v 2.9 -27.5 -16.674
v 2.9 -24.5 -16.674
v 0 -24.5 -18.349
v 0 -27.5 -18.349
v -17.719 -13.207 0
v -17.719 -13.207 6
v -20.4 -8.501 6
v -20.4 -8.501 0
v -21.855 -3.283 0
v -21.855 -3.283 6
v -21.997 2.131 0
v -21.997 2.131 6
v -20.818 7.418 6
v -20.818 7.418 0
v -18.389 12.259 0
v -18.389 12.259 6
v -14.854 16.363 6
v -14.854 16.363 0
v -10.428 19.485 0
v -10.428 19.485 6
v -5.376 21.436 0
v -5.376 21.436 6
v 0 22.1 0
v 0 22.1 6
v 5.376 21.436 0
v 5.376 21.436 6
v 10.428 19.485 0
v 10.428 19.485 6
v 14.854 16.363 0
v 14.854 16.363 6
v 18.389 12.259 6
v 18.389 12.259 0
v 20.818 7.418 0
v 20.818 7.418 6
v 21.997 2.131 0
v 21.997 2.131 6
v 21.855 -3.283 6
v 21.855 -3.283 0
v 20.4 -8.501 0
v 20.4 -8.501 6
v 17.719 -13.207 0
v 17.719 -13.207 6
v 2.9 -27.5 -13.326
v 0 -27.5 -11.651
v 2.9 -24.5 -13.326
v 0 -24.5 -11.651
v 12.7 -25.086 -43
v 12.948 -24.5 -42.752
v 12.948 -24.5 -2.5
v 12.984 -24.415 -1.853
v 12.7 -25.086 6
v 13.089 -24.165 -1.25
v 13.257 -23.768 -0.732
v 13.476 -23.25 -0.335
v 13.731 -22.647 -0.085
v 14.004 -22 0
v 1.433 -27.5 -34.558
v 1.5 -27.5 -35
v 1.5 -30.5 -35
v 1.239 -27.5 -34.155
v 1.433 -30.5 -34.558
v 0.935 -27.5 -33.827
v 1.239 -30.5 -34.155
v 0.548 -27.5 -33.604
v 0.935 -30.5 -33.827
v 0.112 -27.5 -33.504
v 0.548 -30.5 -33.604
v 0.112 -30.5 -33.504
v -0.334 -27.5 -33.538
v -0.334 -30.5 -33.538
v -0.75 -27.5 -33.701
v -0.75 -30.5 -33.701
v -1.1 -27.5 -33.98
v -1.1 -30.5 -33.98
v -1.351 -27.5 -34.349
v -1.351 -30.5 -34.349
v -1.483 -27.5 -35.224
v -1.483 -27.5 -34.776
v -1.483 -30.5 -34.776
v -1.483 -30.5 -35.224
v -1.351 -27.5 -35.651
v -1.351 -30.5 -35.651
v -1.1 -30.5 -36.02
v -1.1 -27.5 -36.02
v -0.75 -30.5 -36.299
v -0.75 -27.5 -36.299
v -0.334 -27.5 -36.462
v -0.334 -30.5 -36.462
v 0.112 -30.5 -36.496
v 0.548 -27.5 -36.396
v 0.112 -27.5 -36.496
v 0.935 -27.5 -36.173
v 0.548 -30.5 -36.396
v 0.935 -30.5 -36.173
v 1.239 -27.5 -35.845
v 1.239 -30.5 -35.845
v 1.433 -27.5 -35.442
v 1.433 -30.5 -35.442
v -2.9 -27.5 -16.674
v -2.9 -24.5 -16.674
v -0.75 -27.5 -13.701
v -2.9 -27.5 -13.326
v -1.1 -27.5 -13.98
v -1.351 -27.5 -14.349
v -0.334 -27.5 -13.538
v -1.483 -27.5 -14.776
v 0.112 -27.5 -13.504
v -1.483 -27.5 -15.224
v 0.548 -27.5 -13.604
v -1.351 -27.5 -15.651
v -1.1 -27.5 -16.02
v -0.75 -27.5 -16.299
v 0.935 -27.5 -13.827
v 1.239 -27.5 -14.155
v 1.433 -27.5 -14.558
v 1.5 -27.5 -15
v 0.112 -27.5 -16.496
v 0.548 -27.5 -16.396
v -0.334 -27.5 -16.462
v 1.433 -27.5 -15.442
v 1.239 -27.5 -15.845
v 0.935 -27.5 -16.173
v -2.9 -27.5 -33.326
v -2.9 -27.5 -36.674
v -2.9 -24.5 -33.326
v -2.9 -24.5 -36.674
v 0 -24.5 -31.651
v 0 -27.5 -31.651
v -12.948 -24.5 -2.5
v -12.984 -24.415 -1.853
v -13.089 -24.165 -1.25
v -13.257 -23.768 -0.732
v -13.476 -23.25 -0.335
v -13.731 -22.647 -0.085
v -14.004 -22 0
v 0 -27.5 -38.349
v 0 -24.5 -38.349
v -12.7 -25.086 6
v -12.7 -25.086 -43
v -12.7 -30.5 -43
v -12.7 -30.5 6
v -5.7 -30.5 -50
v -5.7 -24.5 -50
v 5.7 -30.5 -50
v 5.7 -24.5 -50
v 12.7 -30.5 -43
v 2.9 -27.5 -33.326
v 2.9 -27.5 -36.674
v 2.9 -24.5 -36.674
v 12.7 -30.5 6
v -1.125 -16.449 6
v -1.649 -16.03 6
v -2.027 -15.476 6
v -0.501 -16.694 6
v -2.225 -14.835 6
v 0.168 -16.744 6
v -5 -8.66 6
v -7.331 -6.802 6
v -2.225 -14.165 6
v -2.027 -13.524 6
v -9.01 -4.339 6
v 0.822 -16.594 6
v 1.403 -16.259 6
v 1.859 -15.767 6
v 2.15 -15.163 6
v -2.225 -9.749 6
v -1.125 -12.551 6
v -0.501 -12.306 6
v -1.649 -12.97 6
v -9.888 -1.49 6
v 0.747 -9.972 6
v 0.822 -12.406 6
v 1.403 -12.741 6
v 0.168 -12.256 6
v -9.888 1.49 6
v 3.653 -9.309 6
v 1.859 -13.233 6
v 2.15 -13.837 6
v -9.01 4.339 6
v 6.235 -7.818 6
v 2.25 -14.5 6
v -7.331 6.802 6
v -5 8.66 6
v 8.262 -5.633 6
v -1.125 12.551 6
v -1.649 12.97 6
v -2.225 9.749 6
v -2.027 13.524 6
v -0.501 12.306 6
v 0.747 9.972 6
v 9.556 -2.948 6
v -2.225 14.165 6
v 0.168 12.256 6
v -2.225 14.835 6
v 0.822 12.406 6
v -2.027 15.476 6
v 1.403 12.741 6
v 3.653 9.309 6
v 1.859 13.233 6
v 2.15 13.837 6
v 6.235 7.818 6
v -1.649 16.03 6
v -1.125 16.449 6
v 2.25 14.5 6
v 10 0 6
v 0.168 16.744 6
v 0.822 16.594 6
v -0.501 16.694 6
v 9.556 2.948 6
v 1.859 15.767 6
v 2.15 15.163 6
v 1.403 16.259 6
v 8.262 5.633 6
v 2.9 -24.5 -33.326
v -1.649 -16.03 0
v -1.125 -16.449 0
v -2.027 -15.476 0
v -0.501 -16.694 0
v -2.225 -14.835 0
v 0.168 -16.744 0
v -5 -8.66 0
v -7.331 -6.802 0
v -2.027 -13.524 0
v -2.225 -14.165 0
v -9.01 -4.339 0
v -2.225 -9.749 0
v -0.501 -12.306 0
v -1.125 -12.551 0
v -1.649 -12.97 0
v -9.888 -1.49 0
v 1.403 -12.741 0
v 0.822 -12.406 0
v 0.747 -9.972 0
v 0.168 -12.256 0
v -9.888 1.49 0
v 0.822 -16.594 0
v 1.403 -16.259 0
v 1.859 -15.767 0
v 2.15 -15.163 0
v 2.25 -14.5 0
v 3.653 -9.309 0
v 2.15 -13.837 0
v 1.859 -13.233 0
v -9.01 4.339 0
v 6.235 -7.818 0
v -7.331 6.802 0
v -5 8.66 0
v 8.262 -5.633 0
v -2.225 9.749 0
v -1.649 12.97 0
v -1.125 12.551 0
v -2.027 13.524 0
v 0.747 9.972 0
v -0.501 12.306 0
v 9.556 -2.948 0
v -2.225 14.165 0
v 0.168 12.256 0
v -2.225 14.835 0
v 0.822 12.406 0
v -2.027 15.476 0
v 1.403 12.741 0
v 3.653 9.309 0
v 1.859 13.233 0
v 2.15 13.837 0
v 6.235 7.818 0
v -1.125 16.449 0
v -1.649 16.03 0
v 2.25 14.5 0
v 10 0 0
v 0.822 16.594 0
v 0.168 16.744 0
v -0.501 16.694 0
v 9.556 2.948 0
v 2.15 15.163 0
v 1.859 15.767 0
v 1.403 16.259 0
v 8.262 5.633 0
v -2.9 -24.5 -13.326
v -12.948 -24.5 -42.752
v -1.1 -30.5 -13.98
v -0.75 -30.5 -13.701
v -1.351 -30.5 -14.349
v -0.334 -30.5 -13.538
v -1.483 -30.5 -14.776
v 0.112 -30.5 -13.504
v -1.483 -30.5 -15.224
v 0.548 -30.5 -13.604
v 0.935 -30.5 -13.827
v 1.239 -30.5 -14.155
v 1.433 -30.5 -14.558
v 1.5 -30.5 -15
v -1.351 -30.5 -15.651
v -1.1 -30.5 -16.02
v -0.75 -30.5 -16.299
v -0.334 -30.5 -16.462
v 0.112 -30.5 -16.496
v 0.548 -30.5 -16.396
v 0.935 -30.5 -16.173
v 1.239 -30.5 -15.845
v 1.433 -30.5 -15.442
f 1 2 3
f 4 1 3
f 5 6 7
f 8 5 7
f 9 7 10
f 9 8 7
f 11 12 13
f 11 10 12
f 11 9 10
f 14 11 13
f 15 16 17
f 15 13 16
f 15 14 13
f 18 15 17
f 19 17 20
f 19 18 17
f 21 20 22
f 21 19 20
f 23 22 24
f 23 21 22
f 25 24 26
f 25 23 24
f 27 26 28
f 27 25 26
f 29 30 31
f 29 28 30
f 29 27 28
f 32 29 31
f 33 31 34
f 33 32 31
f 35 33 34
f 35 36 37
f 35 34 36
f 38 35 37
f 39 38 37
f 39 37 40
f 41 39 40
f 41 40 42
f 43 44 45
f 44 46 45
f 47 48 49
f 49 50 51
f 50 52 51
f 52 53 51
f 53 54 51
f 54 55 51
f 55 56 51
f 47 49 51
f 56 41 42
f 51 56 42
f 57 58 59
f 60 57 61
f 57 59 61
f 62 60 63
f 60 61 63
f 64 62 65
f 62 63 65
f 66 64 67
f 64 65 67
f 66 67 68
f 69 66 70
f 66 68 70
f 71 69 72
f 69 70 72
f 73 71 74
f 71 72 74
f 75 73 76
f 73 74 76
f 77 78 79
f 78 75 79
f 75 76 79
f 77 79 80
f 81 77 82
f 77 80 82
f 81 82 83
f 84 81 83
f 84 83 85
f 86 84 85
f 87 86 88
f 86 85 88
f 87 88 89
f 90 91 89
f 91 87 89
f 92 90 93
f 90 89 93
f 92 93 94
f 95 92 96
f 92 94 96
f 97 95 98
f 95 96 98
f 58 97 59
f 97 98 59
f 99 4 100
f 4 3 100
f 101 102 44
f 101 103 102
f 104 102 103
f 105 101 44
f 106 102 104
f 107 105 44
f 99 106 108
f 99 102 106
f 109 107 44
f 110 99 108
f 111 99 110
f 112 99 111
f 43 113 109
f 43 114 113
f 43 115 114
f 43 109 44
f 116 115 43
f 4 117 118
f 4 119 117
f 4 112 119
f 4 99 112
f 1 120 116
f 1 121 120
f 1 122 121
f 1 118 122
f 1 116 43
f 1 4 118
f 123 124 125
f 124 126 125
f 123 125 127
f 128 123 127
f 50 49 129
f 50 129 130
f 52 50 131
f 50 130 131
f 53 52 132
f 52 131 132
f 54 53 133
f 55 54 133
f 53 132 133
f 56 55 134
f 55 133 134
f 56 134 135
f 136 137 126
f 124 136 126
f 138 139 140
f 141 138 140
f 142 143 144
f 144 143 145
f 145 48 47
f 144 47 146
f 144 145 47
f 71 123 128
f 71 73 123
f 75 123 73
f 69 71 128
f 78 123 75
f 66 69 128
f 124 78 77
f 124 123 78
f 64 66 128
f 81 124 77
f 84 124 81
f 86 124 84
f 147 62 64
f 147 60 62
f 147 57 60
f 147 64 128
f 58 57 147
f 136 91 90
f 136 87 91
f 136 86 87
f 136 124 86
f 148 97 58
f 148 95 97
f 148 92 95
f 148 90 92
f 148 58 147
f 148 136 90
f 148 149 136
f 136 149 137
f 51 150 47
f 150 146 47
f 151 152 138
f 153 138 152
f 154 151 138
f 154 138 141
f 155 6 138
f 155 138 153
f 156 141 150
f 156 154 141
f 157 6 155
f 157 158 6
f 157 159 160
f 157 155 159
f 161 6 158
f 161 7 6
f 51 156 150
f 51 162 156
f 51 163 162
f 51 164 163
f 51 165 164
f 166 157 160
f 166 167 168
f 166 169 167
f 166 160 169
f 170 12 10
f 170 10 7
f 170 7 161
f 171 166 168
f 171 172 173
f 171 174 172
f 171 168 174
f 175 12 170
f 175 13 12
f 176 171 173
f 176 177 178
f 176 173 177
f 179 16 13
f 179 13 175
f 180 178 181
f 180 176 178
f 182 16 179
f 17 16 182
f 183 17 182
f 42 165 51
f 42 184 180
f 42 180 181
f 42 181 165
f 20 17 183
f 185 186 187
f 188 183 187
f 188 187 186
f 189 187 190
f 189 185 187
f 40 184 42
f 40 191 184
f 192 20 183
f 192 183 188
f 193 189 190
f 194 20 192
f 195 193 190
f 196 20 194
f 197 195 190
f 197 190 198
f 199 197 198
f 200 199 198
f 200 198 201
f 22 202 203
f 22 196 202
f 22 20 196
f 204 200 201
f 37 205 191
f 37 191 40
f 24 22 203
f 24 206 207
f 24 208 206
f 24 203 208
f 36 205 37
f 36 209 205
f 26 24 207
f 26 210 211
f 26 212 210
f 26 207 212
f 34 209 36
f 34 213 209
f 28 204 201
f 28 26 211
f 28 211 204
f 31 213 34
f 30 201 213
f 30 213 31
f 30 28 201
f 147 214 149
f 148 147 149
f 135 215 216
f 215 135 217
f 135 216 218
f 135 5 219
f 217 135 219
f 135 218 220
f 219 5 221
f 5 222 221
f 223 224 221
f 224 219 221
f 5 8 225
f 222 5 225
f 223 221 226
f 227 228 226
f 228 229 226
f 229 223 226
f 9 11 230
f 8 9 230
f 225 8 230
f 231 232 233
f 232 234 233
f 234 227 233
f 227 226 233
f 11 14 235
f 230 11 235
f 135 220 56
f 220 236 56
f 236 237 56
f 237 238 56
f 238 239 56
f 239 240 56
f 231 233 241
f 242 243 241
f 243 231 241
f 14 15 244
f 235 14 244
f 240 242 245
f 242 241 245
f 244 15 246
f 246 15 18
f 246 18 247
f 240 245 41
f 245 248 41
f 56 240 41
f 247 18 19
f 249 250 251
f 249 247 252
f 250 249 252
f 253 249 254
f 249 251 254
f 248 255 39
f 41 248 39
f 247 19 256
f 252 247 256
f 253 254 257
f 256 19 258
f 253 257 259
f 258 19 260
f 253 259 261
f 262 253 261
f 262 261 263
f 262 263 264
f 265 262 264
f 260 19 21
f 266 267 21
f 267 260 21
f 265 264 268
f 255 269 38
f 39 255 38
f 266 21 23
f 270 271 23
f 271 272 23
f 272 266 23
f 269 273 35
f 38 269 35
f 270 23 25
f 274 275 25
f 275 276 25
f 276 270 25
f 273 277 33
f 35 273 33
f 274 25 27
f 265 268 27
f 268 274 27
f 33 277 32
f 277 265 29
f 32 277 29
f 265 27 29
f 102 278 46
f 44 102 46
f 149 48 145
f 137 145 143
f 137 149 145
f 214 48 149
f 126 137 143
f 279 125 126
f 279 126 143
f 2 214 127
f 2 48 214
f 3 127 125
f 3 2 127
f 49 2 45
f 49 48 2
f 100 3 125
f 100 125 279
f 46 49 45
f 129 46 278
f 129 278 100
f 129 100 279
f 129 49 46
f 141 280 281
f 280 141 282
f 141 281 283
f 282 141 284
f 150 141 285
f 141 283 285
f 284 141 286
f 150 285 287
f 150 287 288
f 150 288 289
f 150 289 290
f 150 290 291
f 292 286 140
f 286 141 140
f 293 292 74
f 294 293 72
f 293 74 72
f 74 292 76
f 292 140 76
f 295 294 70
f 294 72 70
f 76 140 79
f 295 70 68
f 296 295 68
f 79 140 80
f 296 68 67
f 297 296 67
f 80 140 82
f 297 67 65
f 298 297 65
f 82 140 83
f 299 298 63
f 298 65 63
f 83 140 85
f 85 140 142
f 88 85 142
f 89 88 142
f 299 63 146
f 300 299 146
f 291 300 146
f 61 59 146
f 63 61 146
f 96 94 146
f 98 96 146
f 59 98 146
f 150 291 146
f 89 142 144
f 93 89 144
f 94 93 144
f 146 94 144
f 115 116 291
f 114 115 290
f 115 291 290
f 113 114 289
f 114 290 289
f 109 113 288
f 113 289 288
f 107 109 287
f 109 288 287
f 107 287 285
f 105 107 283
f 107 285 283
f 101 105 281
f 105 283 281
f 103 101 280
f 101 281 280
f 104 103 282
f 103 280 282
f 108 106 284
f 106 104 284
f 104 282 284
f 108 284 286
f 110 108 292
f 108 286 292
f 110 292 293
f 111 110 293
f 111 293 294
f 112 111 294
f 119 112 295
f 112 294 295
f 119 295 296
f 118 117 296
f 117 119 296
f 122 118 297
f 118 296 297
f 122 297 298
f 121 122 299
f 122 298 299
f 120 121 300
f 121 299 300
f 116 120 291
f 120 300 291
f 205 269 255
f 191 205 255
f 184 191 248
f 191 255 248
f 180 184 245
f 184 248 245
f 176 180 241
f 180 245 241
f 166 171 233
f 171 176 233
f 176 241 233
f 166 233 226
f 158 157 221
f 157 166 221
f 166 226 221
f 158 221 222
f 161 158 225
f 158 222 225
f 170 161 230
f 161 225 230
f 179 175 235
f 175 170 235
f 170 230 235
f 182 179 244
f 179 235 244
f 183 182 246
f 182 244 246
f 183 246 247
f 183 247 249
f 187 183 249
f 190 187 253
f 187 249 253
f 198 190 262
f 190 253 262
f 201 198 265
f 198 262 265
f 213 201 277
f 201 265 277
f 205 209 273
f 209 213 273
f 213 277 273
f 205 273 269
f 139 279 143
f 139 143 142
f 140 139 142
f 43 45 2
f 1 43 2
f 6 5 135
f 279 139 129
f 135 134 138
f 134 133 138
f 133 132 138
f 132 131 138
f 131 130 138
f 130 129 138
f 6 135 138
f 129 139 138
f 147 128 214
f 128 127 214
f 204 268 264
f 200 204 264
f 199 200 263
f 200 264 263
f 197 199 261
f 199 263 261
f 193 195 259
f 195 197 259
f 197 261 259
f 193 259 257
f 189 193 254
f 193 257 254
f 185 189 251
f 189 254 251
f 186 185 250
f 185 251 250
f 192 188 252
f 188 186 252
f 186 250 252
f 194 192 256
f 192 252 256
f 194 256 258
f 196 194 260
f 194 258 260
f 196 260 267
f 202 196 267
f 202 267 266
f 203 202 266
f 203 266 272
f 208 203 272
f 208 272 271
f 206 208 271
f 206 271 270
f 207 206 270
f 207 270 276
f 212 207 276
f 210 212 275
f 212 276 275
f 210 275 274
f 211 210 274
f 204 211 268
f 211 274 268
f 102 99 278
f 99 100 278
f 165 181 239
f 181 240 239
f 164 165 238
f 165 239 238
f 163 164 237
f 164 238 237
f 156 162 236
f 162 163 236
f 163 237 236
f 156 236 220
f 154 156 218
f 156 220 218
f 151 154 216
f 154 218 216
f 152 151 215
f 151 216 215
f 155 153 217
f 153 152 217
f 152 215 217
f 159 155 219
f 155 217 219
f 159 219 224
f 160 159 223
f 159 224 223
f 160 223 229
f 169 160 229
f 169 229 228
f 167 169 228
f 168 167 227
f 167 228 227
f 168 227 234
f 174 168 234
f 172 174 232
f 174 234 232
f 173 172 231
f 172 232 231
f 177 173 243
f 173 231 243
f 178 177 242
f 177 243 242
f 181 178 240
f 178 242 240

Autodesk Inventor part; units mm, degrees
ref_plane "YZ Plane" through (0, 0, 0) normal (1, 0, 0) x (0, 1, 0)
ref_plane "XZ Plane" through (0, 0, 0) normal (0, 1, 0) x (-1, 0, 0)
ref_plane "XY Plane" through (0, 0, 0) normal (0, 0, 1) x (1, 0, 0)
sketch "Sketch1" plane through (0, 0, 0) normal (0, 0, 1) x (1, 0, 0)
  circle A0 centre (0, 0) radius 22.1
  circle A1 centre (0, 14.5) radius 2.25
  circle A2 centre (0, -14.5) radius 2.25
  line L0 (0, 14.5) -> (0, -14.5)
  circle A3 centre (0, 0) radius 10
  line L1 (-12.7, -18.086459) -> (-12.7, -30.5)
  line L2 (-12.7, -30.5) -> (12.7, -30.5)
  line L3 (12.7, -30.5) -> (12.7, -18.086459)
  line L4 (-12.7, -24.5) -> (12.7, -24.5)
  point P0 (0, -30.5)
  dimension "d0" = 44.2
  dimension "d1" = 29
  dimension "d2" = 4.5
  dimension "d3" = 20
  dimension "d4" = 30.5
  dimension "d5" = 6
  dimension "d23" = 25.4
sketch "Sketch1 outline for Extrusion1" plane through (0, 0, 0) normal (0, 0, 1) x (1, 0, 0)
  arc A0 (12.7, -18.086459) -> (-12.7, -18.086459) centre (0, 0) ccw
  line L0 (12.7, -30.5) -> (12.7, -18.086459)
  line L1 (-12.7, -18.086459) -> (-12.7, -30.5)
  line L2 (-12.7, -30.5) -> (12.7, -30.5)
  circle A1 centre (0, -14.5) radius 2.25
  circle A2 centre (0, 14.5) radius 2.25
  circle A3 centre (0, 0) radius 10
extrude "Extrusion1" add sketch "Sketch1 outline for Extrusion1" along normal blind 6
sketch "Sketch1 outline for Extrusion2" plane through (0, 0, 0) normal (0, 0, 1) x (1, 0, 0)
  line L0 (-12.7, -30.5) -> (12.7, -30.5)
  line L1 (-12.7, -24.5) -> (-12.7, -30.5)
  line L2 (12.7, -24.5) -> (-12.7, -24.5)
  line L3 (12.7, -30.5) -> (12.7, -24.5)
extrude "Extrusion2" add sketch "Sketch1 outline for Extrusion2" against normal blind 50
fillet "Fillet1" radius 2.5 1 edges at (0, -24.5, 0)
sketch "Sketch2" plane through (-12.7, -30.5, 6) normal (0, -1, 0) x (1, 0, 0)
  circle A0 centre (12.7, -41) radius 1.5
  circle A1 centre (12.7, -21) radius 1.5
  line L0 (25.4, -56) -> (0, -56) projected
  point P0 (12.7, -6)
  point P1 (12.7, -56)
  dimension "d11" = 20
  dimension "d12" = 15
  dimension "d13" = 3
sketch "Sketch2 outline for Extrusion3" plane through (-12.7, -30.5, 6) normal (0, -1, 0) x (1, 0, 0)
  circle A0 centre (12.7, -21) radius 1.5
  circle A1 centre (12.7, -41) radius 1.5
extrude "Extrusion3" cut sketch "Sketch2 outline for Extrusion3" against normal blind 50
sketch "Sketch3" plane through (-12.7, -24.5, -50) normal (0, 1, 0) x (1, 0, 0)
  circle A0 centre (12.7, -35) radius 1.5
  circle A1 centre (12.7, -15) radius 1.5
  line L0 (25.4, -47.5) -> (0, -47.5)
  line L1 (25.4, -47.5) -> (25.4, 0)
  line L2 (0, 0) -> (25.4, 0)
  line L3 (0, -47.5) -> (0, 0)
  line L4 (12.7, -18.348632) -> (9.8, -16.674316)
  line L5 (9.8, -16.674316) -> (9.8, -13.325684)
  line L6 (9.8, -13.325684) -> (12.7, -11.651368)
  line L7 (12.7, -11.651368) -> (15.6, -13.325684)
  line L8 (15.6, -13.325684) -> (15.6, -16.674316)
  line L9 (15.6, -16.674316) -> (12.7, -18.348632)
  line L10 (12.7, -31.651368) -> (15.6, -33.325684)
  line L11 (15.6, -33.325684) -> (15.6, -36.674316)
  line L12 (15.6, -36.674316) -> (12.7, -38.348632)
  line L13 (12.7, -38.348632) -> (9.8, -36.674316)
  line L14 (9.8, -36.674316) -> (9.8, -33.325684)
  line L15 (9.8, -33.325684) -> (12.7, -31.651368)
  point P0 (12.7, -50)
  point P1 (12.7, -15)
  point P2 (12.7, -35)
  point P3 (15.6, -15)
  dimension "d16" = 5.8
  dimension "d17" = 5.8
sketch "Sketch3 outline for Extrusion4" plane through (-12.7, -24.5, -50) normal (0, 1, 0) x (1, 0, 0)
  line L0 (12.7, -18.348632) -> (15.6, -16.674316)
  line L1 (9.8, -16.674316) -> (12.7, -18.348632)
  line L2 (15.6, -16.674316) -> (15.6, -13.325684)
  line L3 (9.8, -13.325684) -> (9.8, -16.674316)
  line L4 (15.6, -13.325684) -> (12.7, -11.651368)
  line L5 (12.7, -11.651368) -> (9.8, -13.325684)
  circle A0 centre (12.7, -15) radius 1.5
  line L6 (12.7, -31.651368) -> (9.8, -33.325684)
  line L7 (15.6, -33.325684) -> (12.7, -31.651368)
  line L8 (9.8, -33.325684) -> (9.8, -36.674316)
  line L9 (15.6, -36.674316) -> (15.6, -33.325684)
  line L10 (9.8, -36.674316) -> (12.7, -38.348632)
  line L11 (12.7, -38.348632) -> (15.6, -36.674316)
  circle A1 centre (12.7, -35) radius 1.5
extrude "Extrusion4" cut sketch "Sketch3 outline for Extrusion4" against normal blind 3
chamfer "Chamfer1" distance 7 angle 45 2 edges at (12.7, -27.5, -50) (-12.7, -27.5, -50)
chamfer "Chamfer2" distance 7 angle 45 2 edges at (12.7, -18.0865, 3) (-12.7, -18.0865, 3)
properties part number "MOTOR_NUEVO_DC" material "Steel, Mild, Welded"
